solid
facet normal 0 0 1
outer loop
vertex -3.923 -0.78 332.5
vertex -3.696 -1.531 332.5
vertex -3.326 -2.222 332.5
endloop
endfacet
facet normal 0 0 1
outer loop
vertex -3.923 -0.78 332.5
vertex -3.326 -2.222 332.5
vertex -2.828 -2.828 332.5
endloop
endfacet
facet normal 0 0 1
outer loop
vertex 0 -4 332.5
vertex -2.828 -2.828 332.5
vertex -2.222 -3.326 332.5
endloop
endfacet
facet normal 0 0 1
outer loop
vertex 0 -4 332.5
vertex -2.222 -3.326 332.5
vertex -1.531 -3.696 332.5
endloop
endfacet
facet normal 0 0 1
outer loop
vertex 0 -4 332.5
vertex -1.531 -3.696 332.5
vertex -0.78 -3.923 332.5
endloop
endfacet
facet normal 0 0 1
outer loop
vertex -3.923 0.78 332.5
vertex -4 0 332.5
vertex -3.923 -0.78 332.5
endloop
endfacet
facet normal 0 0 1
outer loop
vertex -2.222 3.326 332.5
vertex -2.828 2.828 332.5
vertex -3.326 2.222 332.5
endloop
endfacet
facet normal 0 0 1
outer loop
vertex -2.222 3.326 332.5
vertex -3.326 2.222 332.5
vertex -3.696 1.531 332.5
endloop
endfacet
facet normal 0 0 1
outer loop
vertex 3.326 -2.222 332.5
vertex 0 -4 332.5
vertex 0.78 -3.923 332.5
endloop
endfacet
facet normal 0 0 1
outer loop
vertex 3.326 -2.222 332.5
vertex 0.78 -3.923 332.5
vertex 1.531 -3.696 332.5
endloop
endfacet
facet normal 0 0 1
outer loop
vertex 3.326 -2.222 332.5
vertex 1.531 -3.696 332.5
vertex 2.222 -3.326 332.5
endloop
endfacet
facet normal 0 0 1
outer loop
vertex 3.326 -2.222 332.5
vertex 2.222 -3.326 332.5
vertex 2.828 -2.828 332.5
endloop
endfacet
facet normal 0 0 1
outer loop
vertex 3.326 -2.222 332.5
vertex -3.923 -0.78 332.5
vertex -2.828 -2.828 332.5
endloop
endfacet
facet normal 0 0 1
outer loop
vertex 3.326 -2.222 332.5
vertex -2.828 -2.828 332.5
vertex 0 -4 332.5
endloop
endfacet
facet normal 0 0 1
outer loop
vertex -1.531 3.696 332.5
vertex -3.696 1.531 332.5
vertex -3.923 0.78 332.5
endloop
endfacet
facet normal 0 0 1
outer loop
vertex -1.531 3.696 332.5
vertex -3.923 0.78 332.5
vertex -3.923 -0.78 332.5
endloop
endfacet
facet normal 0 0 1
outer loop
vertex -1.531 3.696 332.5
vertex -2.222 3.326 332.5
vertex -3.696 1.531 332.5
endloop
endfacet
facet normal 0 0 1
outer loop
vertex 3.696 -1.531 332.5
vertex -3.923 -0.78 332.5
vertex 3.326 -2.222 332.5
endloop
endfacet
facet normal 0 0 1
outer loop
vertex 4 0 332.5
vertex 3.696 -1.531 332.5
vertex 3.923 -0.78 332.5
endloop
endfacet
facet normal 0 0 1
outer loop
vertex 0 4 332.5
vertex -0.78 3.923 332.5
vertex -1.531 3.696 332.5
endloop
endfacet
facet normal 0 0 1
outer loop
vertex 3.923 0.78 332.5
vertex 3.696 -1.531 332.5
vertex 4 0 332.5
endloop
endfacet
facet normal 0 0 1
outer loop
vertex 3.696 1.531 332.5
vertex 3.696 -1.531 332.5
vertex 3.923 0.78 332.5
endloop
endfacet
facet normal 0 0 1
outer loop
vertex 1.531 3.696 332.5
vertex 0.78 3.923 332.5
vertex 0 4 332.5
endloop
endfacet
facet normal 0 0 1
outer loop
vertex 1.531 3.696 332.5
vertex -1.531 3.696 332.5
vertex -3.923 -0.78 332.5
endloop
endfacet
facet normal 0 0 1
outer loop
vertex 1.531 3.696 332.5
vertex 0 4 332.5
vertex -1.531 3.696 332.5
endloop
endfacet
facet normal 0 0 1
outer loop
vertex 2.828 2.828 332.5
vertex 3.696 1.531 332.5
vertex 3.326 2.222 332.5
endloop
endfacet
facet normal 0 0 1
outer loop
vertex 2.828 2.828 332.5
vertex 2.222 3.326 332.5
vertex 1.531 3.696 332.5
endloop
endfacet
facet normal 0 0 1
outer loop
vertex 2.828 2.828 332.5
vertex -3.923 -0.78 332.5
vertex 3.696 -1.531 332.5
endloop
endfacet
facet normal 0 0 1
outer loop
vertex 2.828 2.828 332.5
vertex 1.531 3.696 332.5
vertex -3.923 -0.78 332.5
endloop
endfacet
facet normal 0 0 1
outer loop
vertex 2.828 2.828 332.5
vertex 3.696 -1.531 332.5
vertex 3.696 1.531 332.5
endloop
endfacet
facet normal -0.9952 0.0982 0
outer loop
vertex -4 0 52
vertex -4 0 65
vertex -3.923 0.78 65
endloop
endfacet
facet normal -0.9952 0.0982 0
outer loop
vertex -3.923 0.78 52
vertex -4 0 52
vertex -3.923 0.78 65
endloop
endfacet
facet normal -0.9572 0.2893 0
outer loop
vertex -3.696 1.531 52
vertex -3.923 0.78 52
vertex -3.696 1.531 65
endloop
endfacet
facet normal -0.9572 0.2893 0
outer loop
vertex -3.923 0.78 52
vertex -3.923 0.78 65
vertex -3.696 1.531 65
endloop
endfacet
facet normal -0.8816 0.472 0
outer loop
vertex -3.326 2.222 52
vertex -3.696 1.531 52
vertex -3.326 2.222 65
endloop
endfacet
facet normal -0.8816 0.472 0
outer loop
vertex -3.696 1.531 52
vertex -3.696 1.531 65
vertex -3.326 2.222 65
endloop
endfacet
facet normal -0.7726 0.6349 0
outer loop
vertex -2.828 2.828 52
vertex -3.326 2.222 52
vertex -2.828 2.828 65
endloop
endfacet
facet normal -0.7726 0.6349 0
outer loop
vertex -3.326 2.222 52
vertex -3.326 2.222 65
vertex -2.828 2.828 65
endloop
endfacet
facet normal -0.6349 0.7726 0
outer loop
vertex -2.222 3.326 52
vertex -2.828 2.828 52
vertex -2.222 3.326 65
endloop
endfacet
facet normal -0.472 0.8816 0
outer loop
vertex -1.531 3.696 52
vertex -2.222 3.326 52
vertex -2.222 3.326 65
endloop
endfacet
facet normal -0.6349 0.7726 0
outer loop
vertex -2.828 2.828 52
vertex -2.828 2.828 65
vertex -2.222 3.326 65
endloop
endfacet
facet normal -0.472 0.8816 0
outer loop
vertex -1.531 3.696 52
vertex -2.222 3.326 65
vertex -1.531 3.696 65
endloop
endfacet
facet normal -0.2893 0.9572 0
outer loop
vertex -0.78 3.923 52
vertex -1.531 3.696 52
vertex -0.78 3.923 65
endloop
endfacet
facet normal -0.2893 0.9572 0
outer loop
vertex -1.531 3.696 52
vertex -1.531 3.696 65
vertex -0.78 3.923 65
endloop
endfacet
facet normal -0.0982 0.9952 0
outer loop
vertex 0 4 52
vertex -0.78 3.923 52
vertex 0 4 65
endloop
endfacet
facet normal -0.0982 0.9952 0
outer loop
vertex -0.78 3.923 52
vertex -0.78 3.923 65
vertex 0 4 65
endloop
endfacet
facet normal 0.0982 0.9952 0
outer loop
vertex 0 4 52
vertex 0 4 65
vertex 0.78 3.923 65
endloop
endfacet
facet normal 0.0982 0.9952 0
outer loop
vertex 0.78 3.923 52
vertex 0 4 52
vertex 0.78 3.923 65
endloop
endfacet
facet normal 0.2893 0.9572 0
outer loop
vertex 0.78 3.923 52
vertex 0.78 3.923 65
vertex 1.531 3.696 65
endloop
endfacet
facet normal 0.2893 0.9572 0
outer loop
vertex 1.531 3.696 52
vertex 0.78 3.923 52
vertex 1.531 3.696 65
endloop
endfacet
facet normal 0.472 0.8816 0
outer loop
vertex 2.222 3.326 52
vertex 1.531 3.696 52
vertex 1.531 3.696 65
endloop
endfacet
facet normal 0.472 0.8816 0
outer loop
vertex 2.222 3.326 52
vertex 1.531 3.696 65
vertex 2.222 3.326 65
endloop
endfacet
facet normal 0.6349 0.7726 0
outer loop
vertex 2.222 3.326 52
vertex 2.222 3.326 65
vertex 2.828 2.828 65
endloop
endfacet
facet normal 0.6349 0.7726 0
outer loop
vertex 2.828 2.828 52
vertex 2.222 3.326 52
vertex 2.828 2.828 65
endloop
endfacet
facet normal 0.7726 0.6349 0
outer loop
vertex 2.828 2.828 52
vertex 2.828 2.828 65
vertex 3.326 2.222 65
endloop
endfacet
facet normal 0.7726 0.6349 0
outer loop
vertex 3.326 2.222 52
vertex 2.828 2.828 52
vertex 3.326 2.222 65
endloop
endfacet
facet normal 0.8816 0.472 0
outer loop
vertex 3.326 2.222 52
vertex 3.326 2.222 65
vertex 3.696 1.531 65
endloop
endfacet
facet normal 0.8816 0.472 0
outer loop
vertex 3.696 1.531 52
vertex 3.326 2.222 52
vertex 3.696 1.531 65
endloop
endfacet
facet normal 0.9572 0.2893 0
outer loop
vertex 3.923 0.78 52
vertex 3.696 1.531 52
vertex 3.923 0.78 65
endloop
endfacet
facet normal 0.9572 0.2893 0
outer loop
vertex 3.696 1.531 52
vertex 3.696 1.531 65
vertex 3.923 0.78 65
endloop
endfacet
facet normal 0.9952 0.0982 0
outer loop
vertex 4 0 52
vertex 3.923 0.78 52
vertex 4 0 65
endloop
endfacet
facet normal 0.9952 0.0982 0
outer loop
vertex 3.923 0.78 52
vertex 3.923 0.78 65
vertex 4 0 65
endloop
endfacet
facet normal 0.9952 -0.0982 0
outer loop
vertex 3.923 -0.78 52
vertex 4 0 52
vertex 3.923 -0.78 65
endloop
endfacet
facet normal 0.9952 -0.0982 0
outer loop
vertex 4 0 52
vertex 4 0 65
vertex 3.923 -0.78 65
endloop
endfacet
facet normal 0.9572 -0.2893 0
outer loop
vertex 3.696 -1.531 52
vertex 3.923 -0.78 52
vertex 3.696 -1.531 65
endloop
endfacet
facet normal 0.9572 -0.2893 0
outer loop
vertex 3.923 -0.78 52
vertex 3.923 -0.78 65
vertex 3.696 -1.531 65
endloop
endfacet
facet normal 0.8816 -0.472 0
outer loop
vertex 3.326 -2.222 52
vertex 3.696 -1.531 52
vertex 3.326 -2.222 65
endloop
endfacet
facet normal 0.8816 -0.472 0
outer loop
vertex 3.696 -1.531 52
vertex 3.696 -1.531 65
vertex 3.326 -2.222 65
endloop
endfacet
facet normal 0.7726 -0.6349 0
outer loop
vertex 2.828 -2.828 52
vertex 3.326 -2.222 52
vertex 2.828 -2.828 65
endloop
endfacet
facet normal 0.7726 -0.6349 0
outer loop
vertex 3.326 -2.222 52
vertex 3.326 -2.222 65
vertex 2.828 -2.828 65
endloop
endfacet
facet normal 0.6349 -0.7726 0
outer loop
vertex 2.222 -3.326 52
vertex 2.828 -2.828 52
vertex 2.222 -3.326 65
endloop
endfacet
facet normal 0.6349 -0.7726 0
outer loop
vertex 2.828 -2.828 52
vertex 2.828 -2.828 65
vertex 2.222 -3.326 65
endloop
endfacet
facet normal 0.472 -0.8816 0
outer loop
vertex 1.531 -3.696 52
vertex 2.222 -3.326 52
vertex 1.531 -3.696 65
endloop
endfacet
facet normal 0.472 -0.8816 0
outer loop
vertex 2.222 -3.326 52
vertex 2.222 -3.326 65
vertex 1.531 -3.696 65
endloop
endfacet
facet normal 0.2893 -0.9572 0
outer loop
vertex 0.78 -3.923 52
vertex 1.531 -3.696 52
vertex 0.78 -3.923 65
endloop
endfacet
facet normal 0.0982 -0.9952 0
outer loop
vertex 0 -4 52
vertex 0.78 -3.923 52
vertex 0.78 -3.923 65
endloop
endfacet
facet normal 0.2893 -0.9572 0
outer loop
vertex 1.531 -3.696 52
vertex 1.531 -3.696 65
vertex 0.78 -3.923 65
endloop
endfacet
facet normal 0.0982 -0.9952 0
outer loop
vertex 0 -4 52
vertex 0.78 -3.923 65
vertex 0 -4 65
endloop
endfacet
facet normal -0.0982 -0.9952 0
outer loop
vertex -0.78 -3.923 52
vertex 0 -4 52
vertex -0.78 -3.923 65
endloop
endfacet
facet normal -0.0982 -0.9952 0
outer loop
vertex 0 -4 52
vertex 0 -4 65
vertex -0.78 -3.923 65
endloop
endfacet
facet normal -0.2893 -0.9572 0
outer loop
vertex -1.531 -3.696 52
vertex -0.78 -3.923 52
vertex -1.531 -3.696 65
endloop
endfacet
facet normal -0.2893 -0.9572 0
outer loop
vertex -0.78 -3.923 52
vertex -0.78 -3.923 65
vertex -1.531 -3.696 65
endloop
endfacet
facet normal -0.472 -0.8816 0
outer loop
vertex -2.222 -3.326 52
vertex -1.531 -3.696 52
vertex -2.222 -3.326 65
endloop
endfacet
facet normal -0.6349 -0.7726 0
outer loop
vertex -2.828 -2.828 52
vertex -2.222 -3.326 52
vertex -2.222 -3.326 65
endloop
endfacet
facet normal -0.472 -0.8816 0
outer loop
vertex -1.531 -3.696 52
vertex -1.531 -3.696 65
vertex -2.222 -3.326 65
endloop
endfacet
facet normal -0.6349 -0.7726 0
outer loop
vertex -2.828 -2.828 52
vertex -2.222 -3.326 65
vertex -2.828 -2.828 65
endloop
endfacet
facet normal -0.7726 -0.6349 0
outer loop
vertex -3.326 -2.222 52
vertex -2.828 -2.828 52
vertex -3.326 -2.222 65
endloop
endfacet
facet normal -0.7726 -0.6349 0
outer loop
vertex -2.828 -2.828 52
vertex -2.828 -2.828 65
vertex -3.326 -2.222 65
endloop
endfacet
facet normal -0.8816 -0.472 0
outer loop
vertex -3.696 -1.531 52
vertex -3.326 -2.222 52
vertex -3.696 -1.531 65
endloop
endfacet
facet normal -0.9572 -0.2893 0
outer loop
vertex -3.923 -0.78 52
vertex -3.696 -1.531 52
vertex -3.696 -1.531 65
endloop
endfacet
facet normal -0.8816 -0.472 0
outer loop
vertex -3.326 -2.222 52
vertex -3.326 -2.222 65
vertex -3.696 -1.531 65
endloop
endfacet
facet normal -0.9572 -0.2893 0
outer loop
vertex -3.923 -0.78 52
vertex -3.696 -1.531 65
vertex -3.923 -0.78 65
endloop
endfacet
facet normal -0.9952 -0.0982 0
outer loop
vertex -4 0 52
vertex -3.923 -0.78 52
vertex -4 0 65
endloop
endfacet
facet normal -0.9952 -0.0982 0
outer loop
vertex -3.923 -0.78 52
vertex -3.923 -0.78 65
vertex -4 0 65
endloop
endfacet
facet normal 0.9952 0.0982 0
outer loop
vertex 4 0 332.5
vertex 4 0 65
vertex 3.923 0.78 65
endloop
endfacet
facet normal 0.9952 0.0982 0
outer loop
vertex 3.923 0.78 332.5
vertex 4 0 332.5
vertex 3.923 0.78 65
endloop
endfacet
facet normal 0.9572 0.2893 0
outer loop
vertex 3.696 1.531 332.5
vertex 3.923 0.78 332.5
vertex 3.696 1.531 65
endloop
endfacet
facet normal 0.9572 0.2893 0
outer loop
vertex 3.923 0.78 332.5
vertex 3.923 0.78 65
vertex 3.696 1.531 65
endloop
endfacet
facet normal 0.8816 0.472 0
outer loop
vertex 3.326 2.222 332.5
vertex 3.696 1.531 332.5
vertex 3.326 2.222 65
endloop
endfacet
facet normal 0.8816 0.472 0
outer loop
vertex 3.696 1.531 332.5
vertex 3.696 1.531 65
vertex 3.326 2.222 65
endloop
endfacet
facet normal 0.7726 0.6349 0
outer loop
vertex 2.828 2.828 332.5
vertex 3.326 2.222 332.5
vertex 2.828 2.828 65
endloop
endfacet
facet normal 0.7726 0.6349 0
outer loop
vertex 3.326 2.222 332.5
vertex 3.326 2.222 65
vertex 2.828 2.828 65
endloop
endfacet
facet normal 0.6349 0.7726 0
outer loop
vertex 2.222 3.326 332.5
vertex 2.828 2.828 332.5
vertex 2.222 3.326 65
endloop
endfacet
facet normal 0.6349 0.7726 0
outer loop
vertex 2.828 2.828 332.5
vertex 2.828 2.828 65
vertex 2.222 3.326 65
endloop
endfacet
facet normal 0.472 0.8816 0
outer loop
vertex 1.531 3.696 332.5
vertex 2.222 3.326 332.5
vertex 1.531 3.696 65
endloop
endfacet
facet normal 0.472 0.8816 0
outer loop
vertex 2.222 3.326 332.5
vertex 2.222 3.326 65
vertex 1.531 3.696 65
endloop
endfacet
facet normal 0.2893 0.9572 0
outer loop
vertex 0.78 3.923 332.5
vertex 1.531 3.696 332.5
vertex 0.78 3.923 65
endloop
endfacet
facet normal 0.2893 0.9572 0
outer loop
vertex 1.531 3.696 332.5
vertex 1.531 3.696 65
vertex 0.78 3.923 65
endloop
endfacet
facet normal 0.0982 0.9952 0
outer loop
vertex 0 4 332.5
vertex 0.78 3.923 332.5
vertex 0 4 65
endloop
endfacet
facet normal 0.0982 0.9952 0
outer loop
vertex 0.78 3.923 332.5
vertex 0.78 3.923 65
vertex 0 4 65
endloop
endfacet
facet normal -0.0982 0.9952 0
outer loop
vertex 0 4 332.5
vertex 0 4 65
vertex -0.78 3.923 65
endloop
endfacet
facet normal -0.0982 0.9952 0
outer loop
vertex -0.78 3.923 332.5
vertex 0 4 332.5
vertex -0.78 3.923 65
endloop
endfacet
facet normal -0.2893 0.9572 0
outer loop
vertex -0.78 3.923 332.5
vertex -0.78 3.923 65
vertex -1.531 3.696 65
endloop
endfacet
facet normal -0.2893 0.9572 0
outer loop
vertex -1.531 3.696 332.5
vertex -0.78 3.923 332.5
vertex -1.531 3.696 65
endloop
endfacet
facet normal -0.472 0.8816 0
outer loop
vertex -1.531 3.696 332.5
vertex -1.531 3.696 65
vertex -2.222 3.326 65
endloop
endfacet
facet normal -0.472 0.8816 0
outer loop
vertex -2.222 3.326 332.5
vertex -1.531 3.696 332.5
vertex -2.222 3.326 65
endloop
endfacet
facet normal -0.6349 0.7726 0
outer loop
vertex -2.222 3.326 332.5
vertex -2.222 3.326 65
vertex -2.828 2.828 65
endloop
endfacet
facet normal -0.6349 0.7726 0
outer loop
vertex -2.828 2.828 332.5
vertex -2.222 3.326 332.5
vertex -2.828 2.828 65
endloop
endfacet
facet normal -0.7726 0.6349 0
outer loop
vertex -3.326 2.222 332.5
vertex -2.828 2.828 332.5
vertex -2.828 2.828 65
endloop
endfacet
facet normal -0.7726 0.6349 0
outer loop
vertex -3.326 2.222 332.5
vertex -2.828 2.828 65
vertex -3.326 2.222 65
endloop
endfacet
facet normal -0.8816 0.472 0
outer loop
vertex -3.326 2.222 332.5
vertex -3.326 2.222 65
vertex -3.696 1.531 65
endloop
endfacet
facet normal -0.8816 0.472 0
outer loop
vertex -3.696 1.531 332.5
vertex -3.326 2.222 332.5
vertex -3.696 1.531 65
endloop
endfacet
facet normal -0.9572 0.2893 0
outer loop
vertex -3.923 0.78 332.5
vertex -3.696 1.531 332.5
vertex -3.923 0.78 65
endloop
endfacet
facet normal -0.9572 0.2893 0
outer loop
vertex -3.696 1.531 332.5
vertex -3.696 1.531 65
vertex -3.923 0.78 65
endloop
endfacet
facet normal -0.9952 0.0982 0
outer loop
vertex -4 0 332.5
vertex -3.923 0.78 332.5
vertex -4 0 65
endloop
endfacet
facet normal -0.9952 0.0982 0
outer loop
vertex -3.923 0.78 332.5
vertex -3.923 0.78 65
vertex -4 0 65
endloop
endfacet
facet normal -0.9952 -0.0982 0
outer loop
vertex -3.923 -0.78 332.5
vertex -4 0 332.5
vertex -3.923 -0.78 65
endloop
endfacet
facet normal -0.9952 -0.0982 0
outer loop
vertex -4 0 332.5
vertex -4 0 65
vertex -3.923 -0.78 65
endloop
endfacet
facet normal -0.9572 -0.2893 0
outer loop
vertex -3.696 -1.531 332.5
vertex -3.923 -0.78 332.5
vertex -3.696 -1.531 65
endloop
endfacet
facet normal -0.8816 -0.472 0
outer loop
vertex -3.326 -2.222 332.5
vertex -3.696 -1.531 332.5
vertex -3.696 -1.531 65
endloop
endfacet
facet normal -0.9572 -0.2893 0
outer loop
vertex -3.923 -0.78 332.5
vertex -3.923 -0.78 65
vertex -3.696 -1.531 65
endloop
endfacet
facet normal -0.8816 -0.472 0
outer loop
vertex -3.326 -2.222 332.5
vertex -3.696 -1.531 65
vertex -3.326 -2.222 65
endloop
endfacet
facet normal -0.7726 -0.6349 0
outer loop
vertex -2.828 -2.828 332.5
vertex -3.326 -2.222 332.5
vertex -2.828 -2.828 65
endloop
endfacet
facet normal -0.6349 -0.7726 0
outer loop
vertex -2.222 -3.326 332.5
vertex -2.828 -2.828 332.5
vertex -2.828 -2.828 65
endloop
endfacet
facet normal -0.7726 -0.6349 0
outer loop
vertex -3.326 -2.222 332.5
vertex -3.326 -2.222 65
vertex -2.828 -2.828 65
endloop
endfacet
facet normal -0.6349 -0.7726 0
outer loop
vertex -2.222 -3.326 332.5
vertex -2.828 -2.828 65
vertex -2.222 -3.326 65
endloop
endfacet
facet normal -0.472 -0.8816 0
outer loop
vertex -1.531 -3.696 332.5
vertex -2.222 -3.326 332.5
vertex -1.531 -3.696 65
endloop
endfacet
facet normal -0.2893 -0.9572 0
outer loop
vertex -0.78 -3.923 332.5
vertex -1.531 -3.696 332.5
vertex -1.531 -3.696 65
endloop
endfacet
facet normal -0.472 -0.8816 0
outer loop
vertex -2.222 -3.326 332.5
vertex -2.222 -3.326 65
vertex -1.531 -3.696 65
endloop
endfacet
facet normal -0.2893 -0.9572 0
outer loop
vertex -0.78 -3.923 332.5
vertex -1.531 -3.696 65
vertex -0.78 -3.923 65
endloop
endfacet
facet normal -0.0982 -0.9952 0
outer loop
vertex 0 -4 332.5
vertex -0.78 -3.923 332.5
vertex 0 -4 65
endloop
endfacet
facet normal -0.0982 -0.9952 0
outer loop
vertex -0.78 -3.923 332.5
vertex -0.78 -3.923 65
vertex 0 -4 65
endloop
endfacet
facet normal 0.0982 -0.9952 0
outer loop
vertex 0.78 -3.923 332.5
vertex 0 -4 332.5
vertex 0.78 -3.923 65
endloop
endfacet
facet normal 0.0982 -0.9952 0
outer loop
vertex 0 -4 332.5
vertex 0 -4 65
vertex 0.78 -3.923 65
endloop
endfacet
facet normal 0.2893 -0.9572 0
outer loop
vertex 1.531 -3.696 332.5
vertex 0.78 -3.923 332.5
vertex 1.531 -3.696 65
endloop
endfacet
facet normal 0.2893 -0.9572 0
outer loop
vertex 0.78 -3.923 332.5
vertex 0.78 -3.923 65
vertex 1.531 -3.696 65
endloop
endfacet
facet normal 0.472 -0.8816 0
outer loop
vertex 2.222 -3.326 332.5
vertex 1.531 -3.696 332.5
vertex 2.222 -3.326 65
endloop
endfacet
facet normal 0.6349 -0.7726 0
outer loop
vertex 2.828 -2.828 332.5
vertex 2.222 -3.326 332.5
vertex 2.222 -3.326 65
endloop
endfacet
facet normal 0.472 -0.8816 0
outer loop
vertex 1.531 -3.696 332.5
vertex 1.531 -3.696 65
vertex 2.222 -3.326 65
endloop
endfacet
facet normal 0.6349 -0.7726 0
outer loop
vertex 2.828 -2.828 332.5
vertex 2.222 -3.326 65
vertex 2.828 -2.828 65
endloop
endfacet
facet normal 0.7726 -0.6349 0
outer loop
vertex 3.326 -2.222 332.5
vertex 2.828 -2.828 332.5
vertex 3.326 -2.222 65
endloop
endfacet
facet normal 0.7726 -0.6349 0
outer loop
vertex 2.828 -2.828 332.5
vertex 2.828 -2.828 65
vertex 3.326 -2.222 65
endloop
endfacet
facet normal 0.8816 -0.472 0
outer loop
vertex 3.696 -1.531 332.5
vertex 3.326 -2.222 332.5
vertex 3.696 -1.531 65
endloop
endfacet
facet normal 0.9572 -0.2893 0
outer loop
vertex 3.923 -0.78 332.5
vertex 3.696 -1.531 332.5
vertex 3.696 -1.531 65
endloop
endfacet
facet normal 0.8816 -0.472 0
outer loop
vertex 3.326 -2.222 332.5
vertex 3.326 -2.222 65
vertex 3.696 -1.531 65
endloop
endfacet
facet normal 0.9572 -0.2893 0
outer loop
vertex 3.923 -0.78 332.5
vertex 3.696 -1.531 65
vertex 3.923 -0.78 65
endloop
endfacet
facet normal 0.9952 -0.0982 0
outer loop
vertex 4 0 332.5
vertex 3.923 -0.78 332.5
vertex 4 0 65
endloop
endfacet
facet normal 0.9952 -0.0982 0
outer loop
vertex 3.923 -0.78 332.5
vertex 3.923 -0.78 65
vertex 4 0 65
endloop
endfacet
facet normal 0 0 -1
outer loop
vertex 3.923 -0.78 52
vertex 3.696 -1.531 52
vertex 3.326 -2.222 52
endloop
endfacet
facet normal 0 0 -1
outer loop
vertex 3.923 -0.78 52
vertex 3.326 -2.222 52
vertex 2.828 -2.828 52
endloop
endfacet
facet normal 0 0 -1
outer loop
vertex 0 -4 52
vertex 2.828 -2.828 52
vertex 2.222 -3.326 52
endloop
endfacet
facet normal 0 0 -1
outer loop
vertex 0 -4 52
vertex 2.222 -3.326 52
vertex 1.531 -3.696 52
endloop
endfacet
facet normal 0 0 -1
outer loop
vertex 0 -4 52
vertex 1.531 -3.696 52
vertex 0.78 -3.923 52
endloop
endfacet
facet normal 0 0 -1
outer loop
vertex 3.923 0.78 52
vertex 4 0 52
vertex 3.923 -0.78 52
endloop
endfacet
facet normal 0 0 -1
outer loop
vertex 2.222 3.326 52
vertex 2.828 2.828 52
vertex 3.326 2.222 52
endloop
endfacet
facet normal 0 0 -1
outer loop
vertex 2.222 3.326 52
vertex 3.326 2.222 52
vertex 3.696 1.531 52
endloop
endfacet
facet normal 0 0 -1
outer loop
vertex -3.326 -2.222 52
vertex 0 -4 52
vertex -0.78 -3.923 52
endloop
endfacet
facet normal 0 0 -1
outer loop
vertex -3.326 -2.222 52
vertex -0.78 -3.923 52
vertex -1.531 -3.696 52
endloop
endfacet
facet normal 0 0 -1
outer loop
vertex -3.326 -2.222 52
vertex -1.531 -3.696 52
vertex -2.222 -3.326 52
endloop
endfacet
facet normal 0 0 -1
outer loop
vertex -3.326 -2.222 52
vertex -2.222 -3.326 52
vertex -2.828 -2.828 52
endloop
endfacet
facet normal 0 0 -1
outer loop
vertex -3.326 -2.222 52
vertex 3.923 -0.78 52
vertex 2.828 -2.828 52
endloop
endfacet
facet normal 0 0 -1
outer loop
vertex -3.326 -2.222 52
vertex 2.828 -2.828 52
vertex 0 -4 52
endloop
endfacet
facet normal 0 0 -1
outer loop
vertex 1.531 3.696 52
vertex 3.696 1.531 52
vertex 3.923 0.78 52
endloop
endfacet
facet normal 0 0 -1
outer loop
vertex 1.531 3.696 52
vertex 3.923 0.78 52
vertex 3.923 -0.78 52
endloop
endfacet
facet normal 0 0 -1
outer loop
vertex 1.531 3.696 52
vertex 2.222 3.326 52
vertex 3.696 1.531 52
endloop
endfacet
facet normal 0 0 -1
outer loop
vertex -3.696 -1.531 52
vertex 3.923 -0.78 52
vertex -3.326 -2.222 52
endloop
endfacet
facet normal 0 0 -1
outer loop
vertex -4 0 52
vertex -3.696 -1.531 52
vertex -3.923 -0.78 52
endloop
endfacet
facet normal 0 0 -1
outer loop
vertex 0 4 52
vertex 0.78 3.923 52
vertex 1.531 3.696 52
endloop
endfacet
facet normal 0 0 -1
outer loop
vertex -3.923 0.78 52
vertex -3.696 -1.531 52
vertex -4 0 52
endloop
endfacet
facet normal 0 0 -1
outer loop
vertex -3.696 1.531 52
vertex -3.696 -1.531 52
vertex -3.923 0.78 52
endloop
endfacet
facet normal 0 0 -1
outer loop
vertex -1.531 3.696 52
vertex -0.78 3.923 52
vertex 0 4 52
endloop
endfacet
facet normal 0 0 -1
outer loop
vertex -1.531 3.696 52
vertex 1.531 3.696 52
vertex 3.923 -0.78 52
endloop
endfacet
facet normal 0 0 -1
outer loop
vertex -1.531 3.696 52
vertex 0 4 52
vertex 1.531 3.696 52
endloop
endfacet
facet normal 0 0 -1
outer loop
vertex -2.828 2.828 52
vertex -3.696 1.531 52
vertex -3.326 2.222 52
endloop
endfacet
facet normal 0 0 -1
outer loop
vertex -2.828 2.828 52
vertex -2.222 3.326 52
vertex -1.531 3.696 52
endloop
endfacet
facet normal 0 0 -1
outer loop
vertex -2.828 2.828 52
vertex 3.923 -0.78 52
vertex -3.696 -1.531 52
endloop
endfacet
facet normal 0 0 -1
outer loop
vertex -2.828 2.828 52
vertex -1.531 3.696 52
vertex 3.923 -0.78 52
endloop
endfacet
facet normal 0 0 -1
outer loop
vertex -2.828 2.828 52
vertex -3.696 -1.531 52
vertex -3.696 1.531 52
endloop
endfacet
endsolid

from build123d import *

# Parameters (mm, degrees)
SKETCH1_R           = 4
BOSS_EXTRUDE1_DEPTH = 287.5
SKETCH2_R           = 4
BOSS_EXTRUDE2_DEPTH = 45
SKETCH3_R           = 4
CUT_EXTRUDE1_DEPTH  = 65
SKETCH4_R           = 4
BOSS_EXTRUDE5_DEPTH = 13


with BuildPart() as part:
    # Sketch1 → Boss-Extrude1 (new body)
    with BuildSketch(Plane.XY):
        Circle(SKETCH1_R)
    extrude(amount=BOSS_EXTRUDE1_DEPTH)

    # Sketch2 → Boss-Extrude2 (add)
    with BuildSketch(Plane.XY.offset(287.5)):
        Circle(SKETCH2_R)
    extrude(amount=BOSS_EXTRUDE2_DEPTH)

    # Sketch3 → Cut-Extrude1 (cut)
    with BuildSketch(Plane(origin=(0, 0, 0), x_dir=(-1, 0, 0), z_dir=(0, 0, -1))):
        Circle(SKETCH3_R)
    extrude(amount=-CUT_EXTRUDE1_DEPTH, mode=Mode.SUBTRACT)

    # Sketch4 → Boss-Extrude5 (add)
    with BuildSketch(Plane(origin=(0, 0, 65), x_dir=(-1, 0, 0), z_dir=(0, 0, -1))):
        Circle(SKETCH4_R)
    extrude(amount=BOSS_EXTRUDE5_DEPTH)


solid = part.part
